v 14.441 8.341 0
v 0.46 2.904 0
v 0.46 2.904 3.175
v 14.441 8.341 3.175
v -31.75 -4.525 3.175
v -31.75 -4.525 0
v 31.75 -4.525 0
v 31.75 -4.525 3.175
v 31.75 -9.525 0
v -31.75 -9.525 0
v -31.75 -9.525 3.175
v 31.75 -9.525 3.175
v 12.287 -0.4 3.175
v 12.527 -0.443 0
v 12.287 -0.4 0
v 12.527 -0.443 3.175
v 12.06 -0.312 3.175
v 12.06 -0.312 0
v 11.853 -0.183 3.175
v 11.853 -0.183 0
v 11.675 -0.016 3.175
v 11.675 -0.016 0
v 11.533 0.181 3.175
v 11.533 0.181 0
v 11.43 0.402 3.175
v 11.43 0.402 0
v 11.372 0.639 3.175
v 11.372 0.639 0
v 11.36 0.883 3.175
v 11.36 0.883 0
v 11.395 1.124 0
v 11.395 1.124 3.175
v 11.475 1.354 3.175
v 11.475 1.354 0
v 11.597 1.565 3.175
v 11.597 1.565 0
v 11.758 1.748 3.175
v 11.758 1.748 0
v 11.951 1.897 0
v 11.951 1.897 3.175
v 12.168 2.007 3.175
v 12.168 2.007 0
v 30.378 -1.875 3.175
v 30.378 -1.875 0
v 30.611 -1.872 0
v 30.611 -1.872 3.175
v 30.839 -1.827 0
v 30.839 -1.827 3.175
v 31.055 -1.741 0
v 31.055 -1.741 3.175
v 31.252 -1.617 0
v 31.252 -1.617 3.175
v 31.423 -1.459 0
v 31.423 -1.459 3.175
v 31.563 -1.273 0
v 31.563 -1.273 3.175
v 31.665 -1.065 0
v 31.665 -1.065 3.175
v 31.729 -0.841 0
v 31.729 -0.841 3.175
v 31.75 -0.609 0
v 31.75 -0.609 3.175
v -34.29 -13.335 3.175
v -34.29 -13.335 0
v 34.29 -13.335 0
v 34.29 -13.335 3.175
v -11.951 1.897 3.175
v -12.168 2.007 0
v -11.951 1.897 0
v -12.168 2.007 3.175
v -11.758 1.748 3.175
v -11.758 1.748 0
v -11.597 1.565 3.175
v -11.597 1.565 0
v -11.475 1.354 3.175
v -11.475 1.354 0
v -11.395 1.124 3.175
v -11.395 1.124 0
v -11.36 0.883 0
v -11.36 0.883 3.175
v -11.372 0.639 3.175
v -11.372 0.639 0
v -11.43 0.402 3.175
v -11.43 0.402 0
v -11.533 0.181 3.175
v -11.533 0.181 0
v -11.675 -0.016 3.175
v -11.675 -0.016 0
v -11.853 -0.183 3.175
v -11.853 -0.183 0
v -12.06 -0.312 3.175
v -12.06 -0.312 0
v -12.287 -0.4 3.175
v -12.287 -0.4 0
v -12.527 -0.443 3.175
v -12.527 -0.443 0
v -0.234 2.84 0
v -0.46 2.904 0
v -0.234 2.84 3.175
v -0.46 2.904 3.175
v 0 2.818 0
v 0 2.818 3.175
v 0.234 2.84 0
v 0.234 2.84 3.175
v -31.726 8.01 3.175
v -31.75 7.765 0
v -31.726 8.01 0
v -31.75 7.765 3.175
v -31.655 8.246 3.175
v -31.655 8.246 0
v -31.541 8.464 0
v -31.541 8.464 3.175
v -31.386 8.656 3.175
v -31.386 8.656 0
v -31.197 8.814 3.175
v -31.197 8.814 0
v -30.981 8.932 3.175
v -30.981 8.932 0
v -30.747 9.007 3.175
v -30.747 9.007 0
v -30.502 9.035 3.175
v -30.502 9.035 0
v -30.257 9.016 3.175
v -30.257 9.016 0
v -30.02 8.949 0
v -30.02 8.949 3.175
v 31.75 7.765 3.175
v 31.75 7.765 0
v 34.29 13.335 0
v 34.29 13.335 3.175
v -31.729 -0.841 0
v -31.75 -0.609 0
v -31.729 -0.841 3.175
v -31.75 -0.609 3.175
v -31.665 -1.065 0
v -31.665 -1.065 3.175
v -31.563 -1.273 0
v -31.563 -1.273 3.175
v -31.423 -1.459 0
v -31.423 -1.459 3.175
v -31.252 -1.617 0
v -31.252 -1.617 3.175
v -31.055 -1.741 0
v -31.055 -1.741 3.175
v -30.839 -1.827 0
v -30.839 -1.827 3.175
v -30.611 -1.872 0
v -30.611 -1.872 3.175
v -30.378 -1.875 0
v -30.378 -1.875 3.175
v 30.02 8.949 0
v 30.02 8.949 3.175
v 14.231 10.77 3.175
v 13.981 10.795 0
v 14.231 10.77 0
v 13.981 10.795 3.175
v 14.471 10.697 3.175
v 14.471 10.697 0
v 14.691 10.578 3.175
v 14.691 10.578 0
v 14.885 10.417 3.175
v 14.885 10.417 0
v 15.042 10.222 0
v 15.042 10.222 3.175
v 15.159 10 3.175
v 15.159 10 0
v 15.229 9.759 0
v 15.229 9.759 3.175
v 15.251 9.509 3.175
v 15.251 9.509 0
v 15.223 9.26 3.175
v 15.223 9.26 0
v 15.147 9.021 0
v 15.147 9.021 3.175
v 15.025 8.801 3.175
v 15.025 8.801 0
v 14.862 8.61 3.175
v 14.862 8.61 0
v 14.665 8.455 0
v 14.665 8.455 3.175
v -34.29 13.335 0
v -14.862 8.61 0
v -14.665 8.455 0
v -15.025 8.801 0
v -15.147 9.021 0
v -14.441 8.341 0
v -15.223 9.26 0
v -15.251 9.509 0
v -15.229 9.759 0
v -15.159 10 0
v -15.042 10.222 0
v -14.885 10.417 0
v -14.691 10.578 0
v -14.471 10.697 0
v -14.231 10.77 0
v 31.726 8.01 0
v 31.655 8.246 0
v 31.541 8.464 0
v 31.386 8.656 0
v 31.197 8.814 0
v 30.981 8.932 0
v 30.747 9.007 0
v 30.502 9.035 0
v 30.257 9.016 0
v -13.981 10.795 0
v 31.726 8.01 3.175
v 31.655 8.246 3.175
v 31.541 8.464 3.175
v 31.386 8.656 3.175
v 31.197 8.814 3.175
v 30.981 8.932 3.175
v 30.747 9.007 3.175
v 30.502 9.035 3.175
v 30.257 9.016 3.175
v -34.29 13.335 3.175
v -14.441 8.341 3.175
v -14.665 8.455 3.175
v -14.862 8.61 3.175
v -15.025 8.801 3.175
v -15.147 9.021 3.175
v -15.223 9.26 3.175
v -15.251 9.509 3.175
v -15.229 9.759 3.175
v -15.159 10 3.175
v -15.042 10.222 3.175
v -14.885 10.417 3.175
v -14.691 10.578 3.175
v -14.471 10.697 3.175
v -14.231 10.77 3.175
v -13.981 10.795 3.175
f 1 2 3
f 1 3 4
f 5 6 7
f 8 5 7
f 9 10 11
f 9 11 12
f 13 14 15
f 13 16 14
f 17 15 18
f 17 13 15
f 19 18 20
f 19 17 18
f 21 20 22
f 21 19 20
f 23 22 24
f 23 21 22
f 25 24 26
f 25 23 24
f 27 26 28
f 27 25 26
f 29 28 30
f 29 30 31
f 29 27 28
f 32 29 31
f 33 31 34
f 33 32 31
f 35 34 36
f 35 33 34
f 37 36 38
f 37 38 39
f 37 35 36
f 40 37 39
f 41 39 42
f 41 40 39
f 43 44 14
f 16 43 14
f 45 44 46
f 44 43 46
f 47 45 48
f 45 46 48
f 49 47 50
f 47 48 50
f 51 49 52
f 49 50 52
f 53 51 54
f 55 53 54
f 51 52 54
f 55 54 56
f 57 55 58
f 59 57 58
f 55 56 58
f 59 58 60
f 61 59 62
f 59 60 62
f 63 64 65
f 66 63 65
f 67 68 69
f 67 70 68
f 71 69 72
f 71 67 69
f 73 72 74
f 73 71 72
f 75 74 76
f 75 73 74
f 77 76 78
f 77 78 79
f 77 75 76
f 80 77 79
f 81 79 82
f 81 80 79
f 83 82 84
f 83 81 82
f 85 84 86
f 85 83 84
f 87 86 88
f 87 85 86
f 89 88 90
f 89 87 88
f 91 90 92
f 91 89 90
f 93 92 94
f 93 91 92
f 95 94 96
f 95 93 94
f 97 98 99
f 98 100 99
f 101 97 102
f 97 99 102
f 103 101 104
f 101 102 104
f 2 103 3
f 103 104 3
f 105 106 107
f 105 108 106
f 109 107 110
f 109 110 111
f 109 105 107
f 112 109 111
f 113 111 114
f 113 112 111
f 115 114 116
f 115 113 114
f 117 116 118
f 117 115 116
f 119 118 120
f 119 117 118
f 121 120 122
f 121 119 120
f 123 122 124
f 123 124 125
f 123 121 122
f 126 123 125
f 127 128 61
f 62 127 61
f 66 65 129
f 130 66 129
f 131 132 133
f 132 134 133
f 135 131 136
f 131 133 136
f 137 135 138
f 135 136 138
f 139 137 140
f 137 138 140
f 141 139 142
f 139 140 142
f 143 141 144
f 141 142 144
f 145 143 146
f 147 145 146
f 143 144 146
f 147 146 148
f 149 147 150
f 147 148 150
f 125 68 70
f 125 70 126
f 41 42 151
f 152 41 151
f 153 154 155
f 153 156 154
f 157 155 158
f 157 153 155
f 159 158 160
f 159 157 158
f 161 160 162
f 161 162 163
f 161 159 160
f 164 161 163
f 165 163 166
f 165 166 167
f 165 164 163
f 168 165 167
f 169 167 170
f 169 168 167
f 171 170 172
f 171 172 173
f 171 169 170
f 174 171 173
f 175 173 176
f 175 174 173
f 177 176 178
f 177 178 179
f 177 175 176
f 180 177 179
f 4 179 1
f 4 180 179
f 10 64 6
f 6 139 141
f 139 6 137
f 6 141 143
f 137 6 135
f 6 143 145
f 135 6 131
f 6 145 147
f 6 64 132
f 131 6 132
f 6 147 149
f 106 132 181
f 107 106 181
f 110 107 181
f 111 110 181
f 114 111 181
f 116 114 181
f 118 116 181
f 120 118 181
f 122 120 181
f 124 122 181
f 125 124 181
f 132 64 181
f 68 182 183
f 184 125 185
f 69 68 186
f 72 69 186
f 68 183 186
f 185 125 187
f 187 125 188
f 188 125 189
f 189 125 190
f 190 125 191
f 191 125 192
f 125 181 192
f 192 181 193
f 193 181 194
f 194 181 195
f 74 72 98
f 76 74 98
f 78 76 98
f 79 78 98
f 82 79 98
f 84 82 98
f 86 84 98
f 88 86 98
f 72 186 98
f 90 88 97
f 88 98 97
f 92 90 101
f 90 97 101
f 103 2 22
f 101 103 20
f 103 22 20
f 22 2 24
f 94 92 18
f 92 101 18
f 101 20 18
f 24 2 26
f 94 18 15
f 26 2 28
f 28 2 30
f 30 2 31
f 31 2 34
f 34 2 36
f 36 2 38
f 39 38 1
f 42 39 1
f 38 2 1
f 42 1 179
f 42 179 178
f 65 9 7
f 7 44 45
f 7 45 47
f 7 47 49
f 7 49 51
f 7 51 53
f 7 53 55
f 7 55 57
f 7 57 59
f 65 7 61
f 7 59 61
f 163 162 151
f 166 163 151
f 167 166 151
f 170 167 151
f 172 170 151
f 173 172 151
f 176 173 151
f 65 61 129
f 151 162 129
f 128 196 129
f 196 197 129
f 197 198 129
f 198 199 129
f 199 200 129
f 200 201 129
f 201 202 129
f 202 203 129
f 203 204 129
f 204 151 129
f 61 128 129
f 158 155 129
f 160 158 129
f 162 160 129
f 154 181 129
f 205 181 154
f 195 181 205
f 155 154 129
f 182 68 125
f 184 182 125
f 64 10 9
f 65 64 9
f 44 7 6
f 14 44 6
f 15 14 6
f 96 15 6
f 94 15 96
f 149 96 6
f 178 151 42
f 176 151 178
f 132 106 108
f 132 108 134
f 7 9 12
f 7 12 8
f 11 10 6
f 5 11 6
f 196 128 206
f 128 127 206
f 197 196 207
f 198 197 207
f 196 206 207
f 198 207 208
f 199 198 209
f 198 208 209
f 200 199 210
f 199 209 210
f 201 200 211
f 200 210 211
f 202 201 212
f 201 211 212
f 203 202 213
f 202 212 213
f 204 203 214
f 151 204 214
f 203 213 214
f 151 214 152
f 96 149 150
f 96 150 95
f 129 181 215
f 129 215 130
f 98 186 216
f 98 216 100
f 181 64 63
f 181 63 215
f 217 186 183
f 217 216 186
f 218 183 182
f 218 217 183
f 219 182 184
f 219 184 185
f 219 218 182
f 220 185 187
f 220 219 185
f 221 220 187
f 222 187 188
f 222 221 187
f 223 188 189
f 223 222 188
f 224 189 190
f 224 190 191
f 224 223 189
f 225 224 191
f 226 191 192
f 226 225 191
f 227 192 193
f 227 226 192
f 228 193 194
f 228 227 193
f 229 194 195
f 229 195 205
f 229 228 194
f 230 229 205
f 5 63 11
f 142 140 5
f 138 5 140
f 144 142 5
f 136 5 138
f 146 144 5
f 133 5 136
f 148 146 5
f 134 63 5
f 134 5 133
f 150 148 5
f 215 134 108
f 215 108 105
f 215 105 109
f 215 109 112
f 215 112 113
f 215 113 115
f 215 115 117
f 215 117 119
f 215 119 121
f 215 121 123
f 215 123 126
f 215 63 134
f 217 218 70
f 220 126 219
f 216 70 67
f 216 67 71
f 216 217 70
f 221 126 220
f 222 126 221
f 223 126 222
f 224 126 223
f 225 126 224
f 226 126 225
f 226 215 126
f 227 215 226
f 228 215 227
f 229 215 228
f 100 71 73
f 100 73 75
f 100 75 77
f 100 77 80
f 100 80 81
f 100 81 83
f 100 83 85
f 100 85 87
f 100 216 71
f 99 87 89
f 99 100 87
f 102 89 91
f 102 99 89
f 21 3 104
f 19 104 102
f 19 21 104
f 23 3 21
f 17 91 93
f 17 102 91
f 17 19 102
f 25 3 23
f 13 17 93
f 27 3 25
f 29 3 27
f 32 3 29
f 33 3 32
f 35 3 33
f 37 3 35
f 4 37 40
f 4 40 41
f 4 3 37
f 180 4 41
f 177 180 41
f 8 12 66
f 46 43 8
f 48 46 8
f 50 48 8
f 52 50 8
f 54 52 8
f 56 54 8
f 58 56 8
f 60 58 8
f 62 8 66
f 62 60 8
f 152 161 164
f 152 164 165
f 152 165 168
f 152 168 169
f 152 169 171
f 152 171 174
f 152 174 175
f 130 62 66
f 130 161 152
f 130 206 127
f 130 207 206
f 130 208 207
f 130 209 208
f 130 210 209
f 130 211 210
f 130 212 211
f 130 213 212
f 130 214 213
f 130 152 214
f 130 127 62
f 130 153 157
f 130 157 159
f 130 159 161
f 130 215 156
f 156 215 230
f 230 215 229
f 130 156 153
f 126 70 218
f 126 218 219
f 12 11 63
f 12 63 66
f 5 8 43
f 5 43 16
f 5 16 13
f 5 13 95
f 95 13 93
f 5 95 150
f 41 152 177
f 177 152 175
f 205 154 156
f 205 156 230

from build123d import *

# Parameters (mm, degrees)
SKETCH1_W           = 68.58
SKETCH1_H           = 26.67
SKETCH1_W_2         = 63.5
SKETCH1_H_2         = 5
BOSS_EXTRUDE1_DEPTH = 3.175
FILLET1_R           = 1.27


with BuildPart() as part:
    # Sketch1 → Boss-Extrude1 (new body)
    with BuildSketch(Plane.XY):
        Rectangle(SKETCH1_W, SKETCH1_H)
        Polygon((-20.750635985, 10.795), (0, 2.725308228), (20.750635985, 10.795), align=None, mode=Mode.SUBTRACT)
        with Locations((0, -7.025)):
            Rectangle(SKETCH1_W_2, SKETCH1_H_2, mode=Mode.SUBTRACT)
        Polygon((-31.75, 9.621913994), (-31.75, -1.985), (-7.007935444, 0), align=None, mode=Mode.SUBTRACT)
        Polygon((7.007935444, 0), (31.75, 9.621913994), (31.75, -1.985), align=None, mode=Mode.SUBTRACT)
    extrude(amount=BOSS_EXTRUDE1_DEPTH)

    # Fillet1
    fillet1_edges = [part.edges().sort_by_distance(p)[0] for p in [
        (20.750635985, 10.795, 1.5875),
        (-20.750635985, 10.795, 1.5875),
        (0, 2.725308228, 1.5875),
        (-7.007935444, 0, 1.5875),
        (-31.75, 9.621913994, 1.5875),
        (-31.75, -1.985, 1.5875),
        (7.007935444, 0, 1.5875),
        (31.75, -1.985, 1.5875),
        (31.75, 9.621913994, 1.5875),
    ]]
    fillet(fillet1_edges, radius=FILLET1_R)


solid = part.part
